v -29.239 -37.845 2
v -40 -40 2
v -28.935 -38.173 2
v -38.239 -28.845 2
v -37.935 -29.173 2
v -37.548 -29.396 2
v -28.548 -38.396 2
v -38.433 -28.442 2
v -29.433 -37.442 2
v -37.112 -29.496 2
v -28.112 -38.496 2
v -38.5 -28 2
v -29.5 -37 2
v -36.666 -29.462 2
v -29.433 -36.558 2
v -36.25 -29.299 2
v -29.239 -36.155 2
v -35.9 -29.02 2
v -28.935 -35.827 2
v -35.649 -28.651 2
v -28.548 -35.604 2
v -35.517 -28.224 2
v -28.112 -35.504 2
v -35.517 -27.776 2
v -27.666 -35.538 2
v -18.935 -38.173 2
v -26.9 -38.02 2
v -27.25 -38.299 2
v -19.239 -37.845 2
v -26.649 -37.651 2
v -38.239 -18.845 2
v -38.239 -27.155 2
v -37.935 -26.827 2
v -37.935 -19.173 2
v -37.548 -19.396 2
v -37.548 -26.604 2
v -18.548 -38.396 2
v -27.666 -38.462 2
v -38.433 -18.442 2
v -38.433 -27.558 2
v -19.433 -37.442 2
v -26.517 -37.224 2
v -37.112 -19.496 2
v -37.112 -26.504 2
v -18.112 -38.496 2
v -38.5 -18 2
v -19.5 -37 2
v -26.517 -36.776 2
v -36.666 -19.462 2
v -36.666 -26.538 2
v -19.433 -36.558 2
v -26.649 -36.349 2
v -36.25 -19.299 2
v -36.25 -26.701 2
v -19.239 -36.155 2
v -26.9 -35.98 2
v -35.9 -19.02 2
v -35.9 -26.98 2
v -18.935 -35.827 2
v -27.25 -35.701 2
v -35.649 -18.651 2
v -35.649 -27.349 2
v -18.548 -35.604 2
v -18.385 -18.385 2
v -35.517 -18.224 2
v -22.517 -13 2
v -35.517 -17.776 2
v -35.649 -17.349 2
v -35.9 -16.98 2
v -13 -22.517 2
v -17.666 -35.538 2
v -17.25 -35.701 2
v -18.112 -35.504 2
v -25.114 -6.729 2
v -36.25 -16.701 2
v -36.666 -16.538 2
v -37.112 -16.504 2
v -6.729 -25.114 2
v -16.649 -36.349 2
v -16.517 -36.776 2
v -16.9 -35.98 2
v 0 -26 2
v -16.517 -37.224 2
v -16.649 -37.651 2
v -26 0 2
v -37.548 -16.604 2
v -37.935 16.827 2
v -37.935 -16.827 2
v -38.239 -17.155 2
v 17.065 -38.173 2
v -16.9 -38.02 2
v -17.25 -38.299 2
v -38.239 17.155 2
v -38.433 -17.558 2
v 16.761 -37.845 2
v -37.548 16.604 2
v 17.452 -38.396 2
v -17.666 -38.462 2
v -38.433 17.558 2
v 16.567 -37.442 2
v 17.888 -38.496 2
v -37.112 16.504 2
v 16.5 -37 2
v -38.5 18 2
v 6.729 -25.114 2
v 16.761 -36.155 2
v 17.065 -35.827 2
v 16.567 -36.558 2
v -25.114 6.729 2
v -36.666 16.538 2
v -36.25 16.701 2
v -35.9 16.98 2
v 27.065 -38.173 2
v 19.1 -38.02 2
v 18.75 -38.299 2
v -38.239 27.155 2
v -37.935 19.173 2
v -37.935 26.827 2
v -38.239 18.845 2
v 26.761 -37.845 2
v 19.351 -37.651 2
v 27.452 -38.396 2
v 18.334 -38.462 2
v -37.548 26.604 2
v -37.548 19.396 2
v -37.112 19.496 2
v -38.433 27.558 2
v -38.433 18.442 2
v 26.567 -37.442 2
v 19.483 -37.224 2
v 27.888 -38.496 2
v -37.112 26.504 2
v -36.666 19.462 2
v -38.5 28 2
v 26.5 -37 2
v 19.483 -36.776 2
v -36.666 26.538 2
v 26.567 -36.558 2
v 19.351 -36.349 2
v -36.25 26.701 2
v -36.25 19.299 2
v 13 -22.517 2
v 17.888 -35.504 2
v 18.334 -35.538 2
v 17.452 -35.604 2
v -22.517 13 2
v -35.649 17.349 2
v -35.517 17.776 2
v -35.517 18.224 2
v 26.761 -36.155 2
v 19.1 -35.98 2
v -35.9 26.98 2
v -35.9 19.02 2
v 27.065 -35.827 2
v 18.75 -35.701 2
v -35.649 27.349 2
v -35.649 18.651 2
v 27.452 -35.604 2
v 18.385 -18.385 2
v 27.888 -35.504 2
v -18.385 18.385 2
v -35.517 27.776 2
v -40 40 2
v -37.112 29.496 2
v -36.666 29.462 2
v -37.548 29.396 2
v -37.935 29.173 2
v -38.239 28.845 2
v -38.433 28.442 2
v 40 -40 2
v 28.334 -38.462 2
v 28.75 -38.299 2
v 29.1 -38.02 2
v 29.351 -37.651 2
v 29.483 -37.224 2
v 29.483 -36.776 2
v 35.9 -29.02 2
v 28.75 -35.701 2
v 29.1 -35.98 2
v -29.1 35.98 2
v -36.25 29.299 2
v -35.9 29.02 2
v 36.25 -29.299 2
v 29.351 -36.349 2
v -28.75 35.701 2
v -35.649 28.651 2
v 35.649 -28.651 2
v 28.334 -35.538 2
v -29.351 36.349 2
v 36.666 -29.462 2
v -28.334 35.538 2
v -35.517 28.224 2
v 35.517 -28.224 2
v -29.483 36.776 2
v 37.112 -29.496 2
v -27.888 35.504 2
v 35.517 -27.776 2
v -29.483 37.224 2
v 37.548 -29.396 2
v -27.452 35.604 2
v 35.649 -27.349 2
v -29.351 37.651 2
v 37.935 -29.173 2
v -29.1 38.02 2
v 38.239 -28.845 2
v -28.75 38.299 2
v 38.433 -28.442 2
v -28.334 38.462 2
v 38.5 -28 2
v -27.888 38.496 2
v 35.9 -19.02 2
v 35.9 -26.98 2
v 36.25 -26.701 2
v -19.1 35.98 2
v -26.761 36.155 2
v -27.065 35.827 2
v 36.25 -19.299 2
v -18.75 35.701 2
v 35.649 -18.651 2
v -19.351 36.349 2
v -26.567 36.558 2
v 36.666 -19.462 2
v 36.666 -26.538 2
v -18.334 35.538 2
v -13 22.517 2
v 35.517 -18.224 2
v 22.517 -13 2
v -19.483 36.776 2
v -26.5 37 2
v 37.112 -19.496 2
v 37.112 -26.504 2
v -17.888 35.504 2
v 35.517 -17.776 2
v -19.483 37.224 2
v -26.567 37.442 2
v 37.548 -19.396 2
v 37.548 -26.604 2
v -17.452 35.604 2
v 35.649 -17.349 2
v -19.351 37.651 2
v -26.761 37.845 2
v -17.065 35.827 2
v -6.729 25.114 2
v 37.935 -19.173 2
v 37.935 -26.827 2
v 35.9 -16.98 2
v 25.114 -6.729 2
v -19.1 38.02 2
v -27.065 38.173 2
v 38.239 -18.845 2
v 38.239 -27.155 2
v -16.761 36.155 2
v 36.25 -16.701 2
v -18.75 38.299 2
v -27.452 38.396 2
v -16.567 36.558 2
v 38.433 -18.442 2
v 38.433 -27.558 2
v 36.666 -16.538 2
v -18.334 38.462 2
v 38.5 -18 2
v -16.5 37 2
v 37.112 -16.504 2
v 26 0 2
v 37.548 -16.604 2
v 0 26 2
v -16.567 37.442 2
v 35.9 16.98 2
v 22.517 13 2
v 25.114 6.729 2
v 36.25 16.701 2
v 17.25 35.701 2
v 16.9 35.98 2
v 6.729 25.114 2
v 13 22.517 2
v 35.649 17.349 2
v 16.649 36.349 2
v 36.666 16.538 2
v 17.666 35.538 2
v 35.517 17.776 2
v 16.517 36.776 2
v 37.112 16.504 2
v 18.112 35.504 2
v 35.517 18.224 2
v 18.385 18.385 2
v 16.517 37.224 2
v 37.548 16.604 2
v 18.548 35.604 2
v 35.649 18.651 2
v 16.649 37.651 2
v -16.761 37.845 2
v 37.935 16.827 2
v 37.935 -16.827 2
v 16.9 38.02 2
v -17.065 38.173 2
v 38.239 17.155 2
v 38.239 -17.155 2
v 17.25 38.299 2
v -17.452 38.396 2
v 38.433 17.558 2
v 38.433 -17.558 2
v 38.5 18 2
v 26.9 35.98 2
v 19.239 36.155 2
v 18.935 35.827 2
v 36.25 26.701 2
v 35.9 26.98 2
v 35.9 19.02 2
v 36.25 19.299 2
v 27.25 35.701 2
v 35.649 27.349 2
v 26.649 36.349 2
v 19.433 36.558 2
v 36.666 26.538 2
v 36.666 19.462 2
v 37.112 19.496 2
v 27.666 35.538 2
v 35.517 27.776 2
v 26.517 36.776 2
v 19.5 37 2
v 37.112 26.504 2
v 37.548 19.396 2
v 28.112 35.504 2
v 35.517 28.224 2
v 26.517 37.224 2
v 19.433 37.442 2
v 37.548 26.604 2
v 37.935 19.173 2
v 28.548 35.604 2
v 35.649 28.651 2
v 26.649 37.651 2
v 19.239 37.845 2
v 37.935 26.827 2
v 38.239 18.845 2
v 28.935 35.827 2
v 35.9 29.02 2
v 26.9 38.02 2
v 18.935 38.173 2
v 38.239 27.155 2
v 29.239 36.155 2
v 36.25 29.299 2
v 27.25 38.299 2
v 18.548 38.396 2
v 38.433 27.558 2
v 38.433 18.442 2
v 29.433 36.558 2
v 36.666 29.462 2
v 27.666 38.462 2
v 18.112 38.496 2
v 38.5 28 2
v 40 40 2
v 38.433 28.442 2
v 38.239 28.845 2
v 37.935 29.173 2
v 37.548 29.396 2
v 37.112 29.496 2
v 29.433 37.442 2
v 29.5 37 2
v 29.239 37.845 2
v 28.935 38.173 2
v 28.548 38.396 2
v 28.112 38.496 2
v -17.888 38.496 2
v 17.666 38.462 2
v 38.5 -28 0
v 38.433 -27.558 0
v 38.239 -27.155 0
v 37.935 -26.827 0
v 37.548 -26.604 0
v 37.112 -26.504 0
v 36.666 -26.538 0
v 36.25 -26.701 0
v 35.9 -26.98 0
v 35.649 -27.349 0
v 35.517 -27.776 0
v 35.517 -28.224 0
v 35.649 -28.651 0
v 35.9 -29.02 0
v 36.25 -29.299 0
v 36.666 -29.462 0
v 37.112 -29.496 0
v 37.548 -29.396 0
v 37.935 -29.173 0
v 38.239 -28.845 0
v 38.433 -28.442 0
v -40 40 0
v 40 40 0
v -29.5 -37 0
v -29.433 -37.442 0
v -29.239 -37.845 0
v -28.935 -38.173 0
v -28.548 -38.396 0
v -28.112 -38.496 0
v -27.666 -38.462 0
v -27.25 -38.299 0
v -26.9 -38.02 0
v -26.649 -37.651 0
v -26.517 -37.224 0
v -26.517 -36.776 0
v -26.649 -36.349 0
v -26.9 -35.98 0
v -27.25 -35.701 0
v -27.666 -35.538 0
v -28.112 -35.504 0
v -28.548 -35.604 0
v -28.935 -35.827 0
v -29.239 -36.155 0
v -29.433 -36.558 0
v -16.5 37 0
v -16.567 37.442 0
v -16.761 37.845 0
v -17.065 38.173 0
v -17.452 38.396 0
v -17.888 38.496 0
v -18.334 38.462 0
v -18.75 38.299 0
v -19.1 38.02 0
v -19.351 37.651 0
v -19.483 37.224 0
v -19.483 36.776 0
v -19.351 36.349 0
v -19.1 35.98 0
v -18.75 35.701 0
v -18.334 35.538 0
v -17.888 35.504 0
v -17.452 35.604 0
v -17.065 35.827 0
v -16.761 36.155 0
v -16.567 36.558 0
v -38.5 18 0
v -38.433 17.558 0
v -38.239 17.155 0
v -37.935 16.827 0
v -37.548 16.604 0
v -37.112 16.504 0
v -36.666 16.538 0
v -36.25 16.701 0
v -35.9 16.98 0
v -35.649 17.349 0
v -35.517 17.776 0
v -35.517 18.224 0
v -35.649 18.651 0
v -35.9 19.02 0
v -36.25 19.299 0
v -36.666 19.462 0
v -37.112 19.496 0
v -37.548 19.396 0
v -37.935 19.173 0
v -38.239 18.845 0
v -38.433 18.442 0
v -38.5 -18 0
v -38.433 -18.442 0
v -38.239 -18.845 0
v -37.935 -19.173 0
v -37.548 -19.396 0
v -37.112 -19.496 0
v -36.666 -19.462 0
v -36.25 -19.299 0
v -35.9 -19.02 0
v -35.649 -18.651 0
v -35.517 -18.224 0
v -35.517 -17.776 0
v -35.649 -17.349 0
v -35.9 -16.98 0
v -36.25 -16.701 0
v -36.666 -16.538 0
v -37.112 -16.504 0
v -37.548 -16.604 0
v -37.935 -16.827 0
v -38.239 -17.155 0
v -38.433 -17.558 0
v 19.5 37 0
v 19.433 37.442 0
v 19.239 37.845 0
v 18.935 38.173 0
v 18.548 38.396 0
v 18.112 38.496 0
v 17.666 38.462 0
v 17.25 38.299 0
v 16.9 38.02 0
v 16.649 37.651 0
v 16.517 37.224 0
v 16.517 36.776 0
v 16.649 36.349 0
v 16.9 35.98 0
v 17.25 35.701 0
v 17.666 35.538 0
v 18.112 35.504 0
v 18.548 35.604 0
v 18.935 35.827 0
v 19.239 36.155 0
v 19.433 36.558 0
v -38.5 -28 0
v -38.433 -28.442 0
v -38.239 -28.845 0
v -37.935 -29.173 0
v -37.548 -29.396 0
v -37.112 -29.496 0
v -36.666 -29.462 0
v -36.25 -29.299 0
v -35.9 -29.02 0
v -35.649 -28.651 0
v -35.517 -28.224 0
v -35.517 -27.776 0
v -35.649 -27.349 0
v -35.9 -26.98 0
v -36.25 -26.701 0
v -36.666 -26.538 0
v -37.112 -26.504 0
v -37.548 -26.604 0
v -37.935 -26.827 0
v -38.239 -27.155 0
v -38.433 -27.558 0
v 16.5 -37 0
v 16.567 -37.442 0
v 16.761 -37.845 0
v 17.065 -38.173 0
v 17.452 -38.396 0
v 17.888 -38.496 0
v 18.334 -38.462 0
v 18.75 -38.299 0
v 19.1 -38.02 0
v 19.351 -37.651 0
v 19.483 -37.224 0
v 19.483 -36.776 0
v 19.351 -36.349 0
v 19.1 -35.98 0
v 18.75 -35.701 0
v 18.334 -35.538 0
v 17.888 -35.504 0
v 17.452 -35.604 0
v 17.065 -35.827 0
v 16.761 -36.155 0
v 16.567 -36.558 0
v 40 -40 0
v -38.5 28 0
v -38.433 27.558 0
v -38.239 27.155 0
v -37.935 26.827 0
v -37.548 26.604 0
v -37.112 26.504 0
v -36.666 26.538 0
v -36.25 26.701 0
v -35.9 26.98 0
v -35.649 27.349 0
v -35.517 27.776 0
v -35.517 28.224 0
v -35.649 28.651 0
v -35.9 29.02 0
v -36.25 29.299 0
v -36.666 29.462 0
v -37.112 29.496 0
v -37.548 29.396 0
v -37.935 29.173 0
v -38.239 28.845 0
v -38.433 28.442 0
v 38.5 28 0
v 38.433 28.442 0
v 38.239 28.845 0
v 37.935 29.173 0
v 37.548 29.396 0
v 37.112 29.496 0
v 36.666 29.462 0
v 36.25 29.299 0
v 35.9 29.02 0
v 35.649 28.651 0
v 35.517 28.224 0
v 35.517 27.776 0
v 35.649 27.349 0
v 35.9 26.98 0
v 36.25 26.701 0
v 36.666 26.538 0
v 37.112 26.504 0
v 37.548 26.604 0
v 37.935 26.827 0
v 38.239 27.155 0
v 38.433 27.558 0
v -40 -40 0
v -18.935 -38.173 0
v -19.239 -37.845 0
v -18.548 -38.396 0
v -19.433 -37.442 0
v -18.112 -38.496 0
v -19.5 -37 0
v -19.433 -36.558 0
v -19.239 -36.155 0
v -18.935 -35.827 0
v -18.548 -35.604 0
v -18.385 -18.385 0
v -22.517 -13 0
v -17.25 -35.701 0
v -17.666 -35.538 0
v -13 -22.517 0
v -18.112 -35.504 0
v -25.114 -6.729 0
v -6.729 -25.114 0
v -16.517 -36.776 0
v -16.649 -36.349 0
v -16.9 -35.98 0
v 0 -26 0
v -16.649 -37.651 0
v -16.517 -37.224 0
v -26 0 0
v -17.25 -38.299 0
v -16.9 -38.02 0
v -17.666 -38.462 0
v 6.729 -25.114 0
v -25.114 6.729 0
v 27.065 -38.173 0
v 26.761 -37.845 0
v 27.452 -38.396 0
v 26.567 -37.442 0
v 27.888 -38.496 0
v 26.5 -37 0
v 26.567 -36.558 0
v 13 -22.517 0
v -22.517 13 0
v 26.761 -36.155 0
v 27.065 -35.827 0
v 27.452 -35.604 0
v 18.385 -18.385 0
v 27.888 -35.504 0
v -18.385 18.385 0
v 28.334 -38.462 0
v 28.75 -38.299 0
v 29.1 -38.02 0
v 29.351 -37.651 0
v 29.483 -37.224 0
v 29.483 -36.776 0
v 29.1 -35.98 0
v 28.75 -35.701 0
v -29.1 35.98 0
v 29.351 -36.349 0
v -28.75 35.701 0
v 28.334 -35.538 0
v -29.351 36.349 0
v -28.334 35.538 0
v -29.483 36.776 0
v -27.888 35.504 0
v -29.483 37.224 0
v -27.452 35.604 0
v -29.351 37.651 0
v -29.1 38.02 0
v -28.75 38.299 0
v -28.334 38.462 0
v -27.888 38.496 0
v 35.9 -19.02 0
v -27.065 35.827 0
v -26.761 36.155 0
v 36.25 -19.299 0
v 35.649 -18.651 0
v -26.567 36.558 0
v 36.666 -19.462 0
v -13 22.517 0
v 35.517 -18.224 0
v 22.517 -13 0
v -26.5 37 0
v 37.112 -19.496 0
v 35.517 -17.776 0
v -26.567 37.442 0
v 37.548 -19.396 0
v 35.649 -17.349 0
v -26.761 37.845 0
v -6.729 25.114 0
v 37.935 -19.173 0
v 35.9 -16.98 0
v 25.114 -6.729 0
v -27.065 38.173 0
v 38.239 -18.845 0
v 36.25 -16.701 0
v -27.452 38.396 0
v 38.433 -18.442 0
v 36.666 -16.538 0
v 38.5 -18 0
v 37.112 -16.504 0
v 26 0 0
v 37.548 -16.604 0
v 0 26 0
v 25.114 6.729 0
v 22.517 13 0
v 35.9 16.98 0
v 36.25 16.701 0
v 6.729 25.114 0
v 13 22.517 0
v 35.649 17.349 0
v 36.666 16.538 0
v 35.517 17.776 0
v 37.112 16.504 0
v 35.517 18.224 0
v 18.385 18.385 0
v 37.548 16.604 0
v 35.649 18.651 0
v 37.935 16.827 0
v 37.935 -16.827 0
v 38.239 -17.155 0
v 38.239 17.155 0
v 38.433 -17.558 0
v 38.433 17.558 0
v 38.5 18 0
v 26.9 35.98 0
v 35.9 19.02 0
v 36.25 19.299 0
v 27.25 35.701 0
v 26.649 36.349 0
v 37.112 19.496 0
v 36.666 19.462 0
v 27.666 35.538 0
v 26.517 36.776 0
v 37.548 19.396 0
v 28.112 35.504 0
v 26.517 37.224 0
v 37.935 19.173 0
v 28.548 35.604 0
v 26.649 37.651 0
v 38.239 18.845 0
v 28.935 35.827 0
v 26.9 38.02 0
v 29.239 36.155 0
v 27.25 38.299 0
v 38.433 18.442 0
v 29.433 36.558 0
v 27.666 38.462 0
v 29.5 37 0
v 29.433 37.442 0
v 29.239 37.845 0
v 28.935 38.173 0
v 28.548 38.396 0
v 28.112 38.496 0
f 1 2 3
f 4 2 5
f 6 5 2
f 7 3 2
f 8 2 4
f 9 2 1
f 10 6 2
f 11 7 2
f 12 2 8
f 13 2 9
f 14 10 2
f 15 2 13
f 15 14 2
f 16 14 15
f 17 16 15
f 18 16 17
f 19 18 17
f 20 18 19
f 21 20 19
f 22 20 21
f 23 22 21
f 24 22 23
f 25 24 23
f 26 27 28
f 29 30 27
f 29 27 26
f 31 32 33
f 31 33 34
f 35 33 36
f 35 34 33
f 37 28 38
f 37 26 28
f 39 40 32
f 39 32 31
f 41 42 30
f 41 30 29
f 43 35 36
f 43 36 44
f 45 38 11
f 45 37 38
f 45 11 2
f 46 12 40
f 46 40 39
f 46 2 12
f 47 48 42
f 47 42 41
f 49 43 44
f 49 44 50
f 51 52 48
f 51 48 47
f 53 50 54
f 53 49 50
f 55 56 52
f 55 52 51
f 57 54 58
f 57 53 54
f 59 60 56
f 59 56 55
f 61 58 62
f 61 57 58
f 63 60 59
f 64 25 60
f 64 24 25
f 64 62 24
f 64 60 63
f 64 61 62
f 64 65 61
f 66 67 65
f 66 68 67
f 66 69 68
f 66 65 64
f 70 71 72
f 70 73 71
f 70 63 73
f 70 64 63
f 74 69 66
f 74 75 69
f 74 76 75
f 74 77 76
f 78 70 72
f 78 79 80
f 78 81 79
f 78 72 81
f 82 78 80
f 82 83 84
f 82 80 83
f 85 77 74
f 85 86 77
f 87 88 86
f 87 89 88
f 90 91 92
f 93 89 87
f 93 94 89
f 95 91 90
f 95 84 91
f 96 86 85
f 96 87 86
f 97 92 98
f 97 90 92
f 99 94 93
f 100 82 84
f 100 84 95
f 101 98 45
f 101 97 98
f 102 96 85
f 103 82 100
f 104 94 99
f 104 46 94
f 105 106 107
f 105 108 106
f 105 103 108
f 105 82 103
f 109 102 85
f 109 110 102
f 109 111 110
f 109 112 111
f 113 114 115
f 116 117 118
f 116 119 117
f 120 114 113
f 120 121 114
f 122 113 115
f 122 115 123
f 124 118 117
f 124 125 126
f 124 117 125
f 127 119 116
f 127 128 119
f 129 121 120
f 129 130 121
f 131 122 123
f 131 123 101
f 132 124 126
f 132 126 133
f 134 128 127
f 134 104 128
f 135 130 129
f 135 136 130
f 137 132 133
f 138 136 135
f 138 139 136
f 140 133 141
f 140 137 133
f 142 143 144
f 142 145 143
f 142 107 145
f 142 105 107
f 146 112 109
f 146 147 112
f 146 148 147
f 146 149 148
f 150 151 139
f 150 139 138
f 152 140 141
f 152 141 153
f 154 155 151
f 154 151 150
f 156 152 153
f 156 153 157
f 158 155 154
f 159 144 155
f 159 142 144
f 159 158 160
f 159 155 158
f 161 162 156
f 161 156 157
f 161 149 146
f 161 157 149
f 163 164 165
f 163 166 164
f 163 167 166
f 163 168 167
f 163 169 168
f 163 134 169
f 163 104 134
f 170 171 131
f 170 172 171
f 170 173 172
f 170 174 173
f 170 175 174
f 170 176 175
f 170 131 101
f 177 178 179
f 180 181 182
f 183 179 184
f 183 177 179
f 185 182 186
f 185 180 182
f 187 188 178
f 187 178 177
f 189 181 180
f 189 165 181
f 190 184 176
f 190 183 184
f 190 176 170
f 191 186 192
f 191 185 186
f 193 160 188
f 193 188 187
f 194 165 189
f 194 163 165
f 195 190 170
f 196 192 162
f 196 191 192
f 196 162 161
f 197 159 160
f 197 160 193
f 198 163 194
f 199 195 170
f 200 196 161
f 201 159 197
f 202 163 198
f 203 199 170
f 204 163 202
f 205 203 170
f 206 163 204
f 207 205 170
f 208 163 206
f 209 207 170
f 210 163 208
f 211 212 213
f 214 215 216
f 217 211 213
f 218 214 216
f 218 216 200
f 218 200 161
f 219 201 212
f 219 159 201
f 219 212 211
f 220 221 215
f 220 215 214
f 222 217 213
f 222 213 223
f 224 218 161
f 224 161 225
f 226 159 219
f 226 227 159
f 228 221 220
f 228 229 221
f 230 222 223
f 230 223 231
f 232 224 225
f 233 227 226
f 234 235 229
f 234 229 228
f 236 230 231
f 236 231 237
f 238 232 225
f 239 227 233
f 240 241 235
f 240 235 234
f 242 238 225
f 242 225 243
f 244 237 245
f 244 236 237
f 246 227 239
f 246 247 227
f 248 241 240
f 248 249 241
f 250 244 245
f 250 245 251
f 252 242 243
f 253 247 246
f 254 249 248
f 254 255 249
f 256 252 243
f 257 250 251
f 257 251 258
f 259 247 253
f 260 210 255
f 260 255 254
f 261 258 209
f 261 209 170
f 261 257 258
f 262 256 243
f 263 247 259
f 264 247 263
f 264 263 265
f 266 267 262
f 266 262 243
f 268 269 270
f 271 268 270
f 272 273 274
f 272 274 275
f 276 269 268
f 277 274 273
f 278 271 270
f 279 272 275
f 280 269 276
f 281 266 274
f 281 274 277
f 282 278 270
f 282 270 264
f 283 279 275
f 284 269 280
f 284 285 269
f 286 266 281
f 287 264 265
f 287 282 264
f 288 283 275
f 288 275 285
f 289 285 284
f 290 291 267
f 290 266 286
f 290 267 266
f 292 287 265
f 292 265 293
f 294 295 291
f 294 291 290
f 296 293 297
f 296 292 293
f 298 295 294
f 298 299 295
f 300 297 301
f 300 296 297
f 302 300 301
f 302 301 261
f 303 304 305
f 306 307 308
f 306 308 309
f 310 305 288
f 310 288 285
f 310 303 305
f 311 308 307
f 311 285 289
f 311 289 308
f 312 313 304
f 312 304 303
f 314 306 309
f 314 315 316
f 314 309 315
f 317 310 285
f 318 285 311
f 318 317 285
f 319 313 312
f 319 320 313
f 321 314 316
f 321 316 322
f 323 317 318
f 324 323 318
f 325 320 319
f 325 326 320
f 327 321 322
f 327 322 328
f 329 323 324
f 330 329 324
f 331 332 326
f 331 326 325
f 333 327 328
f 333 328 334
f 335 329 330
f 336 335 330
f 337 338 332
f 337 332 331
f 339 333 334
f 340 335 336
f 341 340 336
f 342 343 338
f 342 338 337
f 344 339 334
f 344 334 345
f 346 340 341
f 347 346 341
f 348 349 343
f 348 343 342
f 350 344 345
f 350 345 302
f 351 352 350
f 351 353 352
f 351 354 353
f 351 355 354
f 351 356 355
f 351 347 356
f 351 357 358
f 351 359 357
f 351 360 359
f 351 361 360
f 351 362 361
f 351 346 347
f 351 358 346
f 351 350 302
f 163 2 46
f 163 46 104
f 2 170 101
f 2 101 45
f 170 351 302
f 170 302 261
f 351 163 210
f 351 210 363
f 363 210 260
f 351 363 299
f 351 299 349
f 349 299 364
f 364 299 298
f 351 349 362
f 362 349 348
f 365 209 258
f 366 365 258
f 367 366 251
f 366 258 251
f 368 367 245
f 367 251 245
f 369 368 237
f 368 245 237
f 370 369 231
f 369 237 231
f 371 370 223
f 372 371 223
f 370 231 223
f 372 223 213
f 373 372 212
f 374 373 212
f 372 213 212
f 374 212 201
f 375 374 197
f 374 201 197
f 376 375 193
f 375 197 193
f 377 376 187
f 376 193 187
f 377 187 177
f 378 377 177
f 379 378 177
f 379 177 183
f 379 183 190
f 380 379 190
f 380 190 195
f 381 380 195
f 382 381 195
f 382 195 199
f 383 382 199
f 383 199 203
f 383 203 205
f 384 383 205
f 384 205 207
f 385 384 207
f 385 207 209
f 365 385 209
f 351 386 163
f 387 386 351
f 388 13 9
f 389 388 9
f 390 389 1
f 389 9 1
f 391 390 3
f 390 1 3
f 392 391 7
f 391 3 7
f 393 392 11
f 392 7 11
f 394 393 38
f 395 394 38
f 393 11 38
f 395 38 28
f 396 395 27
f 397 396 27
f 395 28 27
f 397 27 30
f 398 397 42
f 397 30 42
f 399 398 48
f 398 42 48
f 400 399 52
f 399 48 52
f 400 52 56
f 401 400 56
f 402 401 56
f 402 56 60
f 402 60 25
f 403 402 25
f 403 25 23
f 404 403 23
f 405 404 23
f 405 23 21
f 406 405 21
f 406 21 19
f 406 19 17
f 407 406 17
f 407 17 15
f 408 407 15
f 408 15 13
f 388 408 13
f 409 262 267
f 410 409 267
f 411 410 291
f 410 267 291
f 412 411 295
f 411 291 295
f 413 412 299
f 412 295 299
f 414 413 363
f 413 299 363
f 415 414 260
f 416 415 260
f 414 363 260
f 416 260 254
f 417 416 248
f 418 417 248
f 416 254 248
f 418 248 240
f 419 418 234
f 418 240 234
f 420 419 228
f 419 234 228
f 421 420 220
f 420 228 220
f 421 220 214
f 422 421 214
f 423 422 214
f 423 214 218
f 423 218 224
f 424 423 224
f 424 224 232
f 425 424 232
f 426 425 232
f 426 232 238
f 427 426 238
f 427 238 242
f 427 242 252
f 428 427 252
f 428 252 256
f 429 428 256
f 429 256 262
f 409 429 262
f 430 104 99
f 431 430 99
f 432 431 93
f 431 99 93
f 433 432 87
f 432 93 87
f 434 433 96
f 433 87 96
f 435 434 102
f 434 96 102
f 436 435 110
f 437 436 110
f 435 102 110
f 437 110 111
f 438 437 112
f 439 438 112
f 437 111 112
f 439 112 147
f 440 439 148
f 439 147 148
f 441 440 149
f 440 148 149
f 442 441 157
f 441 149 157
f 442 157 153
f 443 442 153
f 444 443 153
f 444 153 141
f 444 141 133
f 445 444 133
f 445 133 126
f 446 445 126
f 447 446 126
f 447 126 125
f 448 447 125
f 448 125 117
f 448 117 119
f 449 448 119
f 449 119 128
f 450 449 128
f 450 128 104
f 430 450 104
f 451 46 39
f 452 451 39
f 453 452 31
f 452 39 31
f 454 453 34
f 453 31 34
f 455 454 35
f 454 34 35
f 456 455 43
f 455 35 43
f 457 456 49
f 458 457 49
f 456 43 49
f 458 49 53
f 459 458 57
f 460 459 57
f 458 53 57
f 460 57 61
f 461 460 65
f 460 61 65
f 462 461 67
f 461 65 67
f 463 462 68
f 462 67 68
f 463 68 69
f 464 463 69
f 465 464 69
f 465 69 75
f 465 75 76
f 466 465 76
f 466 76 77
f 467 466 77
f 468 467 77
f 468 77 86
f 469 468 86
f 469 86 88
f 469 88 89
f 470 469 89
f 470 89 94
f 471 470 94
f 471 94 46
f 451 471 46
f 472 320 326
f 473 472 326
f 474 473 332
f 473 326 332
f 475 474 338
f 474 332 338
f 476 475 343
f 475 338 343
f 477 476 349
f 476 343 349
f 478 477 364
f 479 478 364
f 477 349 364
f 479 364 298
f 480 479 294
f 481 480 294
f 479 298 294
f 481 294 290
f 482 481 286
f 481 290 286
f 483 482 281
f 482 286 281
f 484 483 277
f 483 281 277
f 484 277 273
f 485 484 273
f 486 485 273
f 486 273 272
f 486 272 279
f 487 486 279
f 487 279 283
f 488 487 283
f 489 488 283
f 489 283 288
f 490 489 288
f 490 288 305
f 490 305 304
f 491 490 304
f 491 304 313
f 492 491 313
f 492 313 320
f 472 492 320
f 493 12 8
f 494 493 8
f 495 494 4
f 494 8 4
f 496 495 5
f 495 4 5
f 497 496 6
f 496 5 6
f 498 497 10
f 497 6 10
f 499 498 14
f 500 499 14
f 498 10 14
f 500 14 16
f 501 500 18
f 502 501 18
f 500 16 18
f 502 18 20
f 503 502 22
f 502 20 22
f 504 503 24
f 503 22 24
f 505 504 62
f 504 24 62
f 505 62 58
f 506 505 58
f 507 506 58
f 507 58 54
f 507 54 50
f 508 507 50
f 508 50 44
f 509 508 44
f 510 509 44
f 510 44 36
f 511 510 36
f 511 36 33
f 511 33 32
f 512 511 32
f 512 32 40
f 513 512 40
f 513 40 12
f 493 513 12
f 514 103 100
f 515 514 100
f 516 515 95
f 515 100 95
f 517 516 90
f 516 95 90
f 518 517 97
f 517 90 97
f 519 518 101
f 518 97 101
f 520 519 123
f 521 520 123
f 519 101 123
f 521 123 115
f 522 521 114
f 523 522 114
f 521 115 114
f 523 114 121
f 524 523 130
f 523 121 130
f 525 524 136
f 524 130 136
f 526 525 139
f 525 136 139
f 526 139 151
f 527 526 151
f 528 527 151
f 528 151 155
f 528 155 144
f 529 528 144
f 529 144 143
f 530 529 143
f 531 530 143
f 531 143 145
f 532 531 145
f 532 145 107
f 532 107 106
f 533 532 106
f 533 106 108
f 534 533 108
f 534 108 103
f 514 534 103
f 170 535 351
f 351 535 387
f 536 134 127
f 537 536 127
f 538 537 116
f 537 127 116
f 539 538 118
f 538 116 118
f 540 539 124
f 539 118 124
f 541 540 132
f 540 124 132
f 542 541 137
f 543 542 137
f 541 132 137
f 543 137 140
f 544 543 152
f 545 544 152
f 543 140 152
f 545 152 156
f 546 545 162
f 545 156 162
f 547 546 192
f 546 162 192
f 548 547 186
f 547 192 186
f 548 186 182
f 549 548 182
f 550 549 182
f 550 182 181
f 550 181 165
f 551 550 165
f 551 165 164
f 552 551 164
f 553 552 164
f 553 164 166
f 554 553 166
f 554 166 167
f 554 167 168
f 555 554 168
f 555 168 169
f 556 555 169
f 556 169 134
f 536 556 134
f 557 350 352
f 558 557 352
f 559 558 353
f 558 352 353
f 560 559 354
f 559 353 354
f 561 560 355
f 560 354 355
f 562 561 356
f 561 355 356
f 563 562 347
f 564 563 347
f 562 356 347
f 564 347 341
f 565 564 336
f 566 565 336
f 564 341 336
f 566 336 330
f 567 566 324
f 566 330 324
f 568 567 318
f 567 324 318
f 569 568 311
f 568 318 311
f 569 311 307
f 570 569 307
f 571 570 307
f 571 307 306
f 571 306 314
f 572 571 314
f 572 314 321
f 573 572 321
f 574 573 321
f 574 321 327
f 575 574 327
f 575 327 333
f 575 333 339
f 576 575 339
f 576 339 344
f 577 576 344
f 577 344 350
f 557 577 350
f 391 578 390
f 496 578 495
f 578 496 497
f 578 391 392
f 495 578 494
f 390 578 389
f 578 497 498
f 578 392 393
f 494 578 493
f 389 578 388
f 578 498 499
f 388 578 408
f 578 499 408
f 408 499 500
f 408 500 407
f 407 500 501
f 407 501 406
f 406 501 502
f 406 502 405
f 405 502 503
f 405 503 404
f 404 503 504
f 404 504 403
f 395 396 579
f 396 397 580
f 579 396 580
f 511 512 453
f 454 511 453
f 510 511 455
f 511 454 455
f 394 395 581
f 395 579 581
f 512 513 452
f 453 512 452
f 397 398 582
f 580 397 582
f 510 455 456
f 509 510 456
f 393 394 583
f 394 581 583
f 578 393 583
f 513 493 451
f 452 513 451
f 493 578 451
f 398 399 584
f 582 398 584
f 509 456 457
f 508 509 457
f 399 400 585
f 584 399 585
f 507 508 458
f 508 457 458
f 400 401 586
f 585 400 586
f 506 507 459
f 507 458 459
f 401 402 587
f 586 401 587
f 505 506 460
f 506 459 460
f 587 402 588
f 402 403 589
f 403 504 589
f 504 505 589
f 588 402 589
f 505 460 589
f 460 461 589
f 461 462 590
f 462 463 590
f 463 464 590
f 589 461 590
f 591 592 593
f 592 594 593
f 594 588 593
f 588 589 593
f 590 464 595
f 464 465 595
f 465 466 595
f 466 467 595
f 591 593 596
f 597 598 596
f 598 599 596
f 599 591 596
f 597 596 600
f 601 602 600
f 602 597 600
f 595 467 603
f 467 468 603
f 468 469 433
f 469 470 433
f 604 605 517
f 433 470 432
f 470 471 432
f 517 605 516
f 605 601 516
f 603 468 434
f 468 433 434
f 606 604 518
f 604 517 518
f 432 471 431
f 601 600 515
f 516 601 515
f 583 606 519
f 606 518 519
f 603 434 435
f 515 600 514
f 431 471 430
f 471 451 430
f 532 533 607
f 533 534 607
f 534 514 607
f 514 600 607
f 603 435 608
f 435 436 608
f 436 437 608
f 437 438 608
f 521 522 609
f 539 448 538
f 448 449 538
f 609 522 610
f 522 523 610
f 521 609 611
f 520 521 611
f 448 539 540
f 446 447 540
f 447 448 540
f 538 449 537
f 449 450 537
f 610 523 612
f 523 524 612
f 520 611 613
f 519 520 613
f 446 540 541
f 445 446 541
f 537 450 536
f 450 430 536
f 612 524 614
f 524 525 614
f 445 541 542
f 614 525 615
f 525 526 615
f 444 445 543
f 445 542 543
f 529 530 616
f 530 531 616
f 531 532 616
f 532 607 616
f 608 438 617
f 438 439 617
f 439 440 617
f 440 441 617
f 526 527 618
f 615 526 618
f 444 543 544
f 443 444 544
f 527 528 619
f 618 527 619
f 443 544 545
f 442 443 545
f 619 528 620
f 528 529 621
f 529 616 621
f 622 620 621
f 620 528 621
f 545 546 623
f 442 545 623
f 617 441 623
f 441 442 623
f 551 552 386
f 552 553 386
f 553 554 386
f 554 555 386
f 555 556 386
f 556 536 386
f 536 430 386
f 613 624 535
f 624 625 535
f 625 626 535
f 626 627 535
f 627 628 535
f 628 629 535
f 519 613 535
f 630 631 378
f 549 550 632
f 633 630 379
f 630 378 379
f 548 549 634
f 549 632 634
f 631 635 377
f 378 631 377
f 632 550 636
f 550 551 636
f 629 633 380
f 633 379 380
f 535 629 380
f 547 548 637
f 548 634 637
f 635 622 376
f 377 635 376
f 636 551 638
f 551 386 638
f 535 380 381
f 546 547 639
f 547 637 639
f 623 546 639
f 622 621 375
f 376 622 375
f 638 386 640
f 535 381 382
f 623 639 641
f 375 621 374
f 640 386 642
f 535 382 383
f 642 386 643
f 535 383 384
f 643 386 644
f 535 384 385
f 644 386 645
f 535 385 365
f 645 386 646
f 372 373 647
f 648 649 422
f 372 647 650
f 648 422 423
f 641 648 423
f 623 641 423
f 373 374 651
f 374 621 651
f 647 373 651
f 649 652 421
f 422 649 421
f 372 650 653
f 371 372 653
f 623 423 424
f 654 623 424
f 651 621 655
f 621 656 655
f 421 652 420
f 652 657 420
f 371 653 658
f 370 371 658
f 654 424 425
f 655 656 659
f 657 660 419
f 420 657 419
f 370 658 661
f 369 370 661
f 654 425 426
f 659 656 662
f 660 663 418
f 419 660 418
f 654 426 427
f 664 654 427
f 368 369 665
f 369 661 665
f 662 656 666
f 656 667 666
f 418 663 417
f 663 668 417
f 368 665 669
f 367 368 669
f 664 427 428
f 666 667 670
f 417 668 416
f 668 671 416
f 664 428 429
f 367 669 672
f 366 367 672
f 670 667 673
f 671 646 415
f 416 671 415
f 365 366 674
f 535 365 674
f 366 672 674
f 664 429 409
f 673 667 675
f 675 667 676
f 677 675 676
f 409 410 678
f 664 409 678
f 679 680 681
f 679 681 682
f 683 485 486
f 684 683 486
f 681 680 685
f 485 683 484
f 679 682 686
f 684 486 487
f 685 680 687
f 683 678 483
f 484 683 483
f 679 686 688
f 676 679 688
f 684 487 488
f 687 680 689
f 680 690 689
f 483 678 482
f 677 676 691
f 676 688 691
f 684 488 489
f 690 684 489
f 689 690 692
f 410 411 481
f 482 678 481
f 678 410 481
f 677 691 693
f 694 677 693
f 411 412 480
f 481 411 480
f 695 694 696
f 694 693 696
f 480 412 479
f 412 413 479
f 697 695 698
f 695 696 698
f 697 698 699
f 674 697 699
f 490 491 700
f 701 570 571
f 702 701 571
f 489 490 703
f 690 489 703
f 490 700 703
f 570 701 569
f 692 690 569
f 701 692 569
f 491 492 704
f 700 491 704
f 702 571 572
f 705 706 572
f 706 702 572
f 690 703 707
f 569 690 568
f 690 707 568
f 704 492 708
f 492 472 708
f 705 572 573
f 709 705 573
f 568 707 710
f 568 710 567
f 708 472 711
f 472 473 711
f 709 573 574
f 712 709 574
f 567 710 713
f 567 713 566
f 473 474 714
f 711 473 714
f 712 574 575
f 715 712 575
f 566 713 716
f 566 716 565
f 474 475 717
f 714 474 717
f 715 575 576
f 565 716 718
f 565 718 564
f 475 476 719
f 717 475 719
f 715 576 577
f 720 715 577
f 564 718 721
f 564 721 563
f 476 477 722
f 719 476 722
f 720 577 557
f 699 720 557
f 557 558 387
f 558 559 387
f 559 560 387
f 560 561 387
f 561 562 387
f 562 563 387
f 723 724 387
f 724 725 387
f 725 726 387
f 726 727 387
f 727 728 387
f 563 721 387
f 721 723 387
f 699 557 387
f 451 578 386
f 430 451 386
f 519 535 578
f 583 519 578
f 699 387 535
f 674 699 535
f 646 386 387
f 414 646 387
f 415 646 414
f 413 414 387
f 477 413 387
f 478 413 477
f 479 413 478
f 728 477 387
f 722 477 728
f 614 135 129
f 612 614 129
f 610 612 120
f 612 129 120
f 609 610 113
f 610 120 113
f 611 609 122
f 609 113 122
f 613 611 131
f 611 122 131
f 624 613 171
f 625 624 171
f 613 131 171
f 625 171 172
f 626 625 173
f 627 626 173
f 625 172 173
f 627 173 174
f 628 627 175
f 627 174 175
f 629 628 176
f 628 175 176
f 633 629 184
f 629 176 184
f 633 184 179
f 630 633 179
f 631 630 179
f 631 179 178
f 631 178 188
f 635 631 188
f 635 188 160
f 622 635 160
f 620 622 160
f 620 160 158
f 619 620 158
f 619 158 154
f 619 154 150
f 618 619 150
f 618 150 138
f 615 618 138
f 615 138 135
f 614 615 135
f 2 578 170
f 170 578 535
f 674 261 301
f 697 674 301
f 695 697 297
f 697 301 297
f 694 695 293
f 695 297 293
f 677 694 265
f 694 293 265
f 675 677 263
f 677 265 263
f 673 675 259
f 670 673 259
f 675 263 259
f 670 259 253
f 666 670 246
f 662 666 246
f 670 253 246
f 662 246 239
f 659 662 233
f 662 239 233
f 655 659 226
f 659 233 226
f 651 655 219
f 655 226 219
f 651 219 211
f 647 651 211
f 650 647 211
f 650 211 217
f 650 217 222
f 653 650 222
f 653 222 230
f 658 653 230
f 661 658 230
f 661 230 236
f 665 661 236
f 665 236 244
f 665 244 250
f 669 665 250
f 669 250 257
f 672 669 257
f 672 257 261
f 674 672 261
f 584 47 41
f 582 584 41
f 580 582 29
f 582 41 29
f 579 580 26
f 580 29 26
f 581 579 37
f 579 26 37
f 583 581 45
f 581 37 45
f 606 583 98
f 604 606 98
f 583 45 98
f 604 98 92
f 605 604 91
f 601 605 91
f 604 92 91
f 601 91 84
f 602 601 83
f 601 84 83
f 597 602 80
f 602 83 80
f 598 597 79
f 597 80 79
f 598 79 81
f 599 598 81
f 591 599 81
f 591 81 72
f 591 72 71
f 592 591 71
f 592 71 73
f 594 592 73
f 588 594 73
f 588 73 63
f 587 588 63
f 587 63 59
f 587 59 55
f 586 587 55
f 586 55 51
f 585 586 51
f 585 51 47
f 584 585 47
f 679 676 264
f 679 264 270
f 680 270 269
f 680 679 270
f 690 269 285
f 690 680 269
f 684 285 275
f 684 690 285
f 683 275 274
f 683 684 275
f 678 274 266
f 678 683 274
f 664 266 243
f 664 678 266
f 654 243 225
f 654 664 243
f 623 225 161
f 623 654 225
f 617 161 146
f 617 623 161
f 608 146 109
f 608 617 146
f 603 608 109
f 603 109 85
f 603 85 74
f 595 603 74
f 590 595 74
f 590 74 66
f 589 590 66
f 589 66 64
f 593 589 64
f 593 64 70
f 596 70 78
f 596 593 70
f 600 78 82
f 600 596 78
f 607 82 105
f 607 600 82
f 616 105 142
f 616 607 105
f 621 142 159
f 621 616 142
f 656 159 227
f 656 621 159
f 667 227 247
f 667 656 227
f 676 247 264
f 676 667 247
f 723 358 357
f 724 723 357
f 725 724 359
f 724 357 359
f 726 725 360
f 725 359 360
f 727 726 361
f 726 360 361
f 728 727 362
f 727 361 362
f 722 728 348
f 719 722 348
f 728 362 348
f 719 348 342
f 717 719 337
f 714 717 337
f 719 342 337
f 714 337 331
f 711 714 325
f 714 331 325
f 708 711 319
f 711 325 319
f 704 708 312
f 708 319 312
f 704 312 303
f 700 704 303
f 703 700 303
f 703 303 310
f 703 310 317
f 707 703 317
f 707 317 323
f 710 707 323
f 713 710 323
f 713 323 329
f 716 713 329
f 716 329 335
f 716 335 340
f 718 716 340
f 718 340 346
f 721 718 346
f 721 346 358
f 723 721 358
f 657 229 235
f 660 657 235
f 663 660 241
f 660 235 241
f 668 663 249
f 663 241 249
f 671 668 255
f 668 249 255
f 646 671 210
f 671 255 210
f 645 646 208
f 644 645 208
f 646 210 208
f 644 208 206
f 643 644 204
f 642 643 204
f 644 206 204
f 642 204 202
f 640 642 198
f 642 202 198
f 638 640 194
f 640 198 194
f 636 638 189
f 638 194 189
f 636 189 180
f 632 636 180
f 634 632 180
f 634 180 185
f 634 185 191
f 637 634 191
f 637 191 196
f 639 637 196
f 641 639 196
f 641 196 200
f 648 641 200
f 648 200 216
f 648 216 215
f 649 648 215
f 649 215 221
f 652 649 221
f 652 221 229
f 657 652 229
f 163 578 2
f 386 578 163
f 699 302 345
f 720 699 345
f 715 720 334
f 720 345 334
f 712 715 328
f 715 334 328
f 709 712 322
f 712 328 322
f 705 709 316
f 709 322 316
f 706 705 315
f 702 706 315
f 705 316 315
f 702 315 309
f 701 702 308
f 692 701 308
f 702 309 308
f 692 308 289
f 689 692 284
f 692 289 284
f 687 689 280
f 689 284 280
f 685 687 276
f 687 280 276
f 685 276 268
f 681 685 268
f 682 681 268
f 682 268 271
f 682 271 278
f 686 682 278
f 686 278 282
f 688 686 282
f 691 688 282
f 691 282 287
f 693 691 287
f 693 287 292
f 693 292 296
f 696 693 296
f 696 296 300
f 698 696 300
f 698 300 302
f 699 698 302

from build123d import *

# Parameters (mm, degrees)
SKETCH_1_W          = 80
SKETCH_1_H          = 80
SKETCH_1_R          = 26
EXTRUDE_1_DEPTH     = 2
SKETCH_2_R          = 1.5
CUT_EXTRUDE_1_DEPTH = 57.603886792


with BuildPart() as part:
    # 草图1 → 凸台-拉伸1 (new body)
    with BuildSketch(Plane.XY):
        Rectangle(SKETCH_1_W, SKETCH_1_H)
        Circle(SKETCH_1_R, mode=Mode.SUBTRACT)
    extrude(amount=EXTRUDE_1_DEPTH)

    # 草图2 → 切除-拉伸1 (cut, through all)
    with BuildSketch(Plane.XY.offset(2)):
        with Locations((37, 28)):
            Circle(SKETCH_2_R)
        with Locations((37, 18)):
            Circle(SKETCH_2_R)
        with Locations((37, -18)):
            Circle(SKETCH_2_R)
        with Locations((37, -28)):
            Circle(SKETCH_2_R)
        with Locations(Location((-37, -28, 0), (0, 0, 180))):
            Circle(SKETCH_2_R)
        with Locations(Location((-37, -18, 0), (0, 0, 180))):
            Circle(SKETCH_2_R)
        with Locations(Location((-37, 18, 0), (0, 0, 180))):
            Circle(SKETCH_2_R)
        with Locations(Location((-37, 28, 0), (0, 0, 180))):
            Circle(SKETCH_2_R)
        with Locations((-28, 37)):
            Circle(SKETCH_2_R)
        with Locations((-18, 37)):
            Circle(SKETCH_2_R)
        with Locations((18, 37)):
            Circle(SKETCH_2_R)
        with Locations((28, 37)):
            Circle(SKETCH_2_R)
        with Locations(Location((28, -37, 0), (0, 0, 180))):
            Circle(SKETCH_2_R)
        with Locations(Location((18, -37, 0), (0, 0, 180))):
            Circle(SKETCH_2_R)
        with Locations(Location((-18, -37, 0), (0, 0, 180))):
            Circle(SKETCH_2_R)
        with Locations(Location((-28, -37, 0), (0, 0, 180))):
            Circle(SKETCH_2_R)
    extrude(amount=-CUT_EXTRUDE_1_DEPTH, mode=Mode.SUBTRACT)


solid = part.part
